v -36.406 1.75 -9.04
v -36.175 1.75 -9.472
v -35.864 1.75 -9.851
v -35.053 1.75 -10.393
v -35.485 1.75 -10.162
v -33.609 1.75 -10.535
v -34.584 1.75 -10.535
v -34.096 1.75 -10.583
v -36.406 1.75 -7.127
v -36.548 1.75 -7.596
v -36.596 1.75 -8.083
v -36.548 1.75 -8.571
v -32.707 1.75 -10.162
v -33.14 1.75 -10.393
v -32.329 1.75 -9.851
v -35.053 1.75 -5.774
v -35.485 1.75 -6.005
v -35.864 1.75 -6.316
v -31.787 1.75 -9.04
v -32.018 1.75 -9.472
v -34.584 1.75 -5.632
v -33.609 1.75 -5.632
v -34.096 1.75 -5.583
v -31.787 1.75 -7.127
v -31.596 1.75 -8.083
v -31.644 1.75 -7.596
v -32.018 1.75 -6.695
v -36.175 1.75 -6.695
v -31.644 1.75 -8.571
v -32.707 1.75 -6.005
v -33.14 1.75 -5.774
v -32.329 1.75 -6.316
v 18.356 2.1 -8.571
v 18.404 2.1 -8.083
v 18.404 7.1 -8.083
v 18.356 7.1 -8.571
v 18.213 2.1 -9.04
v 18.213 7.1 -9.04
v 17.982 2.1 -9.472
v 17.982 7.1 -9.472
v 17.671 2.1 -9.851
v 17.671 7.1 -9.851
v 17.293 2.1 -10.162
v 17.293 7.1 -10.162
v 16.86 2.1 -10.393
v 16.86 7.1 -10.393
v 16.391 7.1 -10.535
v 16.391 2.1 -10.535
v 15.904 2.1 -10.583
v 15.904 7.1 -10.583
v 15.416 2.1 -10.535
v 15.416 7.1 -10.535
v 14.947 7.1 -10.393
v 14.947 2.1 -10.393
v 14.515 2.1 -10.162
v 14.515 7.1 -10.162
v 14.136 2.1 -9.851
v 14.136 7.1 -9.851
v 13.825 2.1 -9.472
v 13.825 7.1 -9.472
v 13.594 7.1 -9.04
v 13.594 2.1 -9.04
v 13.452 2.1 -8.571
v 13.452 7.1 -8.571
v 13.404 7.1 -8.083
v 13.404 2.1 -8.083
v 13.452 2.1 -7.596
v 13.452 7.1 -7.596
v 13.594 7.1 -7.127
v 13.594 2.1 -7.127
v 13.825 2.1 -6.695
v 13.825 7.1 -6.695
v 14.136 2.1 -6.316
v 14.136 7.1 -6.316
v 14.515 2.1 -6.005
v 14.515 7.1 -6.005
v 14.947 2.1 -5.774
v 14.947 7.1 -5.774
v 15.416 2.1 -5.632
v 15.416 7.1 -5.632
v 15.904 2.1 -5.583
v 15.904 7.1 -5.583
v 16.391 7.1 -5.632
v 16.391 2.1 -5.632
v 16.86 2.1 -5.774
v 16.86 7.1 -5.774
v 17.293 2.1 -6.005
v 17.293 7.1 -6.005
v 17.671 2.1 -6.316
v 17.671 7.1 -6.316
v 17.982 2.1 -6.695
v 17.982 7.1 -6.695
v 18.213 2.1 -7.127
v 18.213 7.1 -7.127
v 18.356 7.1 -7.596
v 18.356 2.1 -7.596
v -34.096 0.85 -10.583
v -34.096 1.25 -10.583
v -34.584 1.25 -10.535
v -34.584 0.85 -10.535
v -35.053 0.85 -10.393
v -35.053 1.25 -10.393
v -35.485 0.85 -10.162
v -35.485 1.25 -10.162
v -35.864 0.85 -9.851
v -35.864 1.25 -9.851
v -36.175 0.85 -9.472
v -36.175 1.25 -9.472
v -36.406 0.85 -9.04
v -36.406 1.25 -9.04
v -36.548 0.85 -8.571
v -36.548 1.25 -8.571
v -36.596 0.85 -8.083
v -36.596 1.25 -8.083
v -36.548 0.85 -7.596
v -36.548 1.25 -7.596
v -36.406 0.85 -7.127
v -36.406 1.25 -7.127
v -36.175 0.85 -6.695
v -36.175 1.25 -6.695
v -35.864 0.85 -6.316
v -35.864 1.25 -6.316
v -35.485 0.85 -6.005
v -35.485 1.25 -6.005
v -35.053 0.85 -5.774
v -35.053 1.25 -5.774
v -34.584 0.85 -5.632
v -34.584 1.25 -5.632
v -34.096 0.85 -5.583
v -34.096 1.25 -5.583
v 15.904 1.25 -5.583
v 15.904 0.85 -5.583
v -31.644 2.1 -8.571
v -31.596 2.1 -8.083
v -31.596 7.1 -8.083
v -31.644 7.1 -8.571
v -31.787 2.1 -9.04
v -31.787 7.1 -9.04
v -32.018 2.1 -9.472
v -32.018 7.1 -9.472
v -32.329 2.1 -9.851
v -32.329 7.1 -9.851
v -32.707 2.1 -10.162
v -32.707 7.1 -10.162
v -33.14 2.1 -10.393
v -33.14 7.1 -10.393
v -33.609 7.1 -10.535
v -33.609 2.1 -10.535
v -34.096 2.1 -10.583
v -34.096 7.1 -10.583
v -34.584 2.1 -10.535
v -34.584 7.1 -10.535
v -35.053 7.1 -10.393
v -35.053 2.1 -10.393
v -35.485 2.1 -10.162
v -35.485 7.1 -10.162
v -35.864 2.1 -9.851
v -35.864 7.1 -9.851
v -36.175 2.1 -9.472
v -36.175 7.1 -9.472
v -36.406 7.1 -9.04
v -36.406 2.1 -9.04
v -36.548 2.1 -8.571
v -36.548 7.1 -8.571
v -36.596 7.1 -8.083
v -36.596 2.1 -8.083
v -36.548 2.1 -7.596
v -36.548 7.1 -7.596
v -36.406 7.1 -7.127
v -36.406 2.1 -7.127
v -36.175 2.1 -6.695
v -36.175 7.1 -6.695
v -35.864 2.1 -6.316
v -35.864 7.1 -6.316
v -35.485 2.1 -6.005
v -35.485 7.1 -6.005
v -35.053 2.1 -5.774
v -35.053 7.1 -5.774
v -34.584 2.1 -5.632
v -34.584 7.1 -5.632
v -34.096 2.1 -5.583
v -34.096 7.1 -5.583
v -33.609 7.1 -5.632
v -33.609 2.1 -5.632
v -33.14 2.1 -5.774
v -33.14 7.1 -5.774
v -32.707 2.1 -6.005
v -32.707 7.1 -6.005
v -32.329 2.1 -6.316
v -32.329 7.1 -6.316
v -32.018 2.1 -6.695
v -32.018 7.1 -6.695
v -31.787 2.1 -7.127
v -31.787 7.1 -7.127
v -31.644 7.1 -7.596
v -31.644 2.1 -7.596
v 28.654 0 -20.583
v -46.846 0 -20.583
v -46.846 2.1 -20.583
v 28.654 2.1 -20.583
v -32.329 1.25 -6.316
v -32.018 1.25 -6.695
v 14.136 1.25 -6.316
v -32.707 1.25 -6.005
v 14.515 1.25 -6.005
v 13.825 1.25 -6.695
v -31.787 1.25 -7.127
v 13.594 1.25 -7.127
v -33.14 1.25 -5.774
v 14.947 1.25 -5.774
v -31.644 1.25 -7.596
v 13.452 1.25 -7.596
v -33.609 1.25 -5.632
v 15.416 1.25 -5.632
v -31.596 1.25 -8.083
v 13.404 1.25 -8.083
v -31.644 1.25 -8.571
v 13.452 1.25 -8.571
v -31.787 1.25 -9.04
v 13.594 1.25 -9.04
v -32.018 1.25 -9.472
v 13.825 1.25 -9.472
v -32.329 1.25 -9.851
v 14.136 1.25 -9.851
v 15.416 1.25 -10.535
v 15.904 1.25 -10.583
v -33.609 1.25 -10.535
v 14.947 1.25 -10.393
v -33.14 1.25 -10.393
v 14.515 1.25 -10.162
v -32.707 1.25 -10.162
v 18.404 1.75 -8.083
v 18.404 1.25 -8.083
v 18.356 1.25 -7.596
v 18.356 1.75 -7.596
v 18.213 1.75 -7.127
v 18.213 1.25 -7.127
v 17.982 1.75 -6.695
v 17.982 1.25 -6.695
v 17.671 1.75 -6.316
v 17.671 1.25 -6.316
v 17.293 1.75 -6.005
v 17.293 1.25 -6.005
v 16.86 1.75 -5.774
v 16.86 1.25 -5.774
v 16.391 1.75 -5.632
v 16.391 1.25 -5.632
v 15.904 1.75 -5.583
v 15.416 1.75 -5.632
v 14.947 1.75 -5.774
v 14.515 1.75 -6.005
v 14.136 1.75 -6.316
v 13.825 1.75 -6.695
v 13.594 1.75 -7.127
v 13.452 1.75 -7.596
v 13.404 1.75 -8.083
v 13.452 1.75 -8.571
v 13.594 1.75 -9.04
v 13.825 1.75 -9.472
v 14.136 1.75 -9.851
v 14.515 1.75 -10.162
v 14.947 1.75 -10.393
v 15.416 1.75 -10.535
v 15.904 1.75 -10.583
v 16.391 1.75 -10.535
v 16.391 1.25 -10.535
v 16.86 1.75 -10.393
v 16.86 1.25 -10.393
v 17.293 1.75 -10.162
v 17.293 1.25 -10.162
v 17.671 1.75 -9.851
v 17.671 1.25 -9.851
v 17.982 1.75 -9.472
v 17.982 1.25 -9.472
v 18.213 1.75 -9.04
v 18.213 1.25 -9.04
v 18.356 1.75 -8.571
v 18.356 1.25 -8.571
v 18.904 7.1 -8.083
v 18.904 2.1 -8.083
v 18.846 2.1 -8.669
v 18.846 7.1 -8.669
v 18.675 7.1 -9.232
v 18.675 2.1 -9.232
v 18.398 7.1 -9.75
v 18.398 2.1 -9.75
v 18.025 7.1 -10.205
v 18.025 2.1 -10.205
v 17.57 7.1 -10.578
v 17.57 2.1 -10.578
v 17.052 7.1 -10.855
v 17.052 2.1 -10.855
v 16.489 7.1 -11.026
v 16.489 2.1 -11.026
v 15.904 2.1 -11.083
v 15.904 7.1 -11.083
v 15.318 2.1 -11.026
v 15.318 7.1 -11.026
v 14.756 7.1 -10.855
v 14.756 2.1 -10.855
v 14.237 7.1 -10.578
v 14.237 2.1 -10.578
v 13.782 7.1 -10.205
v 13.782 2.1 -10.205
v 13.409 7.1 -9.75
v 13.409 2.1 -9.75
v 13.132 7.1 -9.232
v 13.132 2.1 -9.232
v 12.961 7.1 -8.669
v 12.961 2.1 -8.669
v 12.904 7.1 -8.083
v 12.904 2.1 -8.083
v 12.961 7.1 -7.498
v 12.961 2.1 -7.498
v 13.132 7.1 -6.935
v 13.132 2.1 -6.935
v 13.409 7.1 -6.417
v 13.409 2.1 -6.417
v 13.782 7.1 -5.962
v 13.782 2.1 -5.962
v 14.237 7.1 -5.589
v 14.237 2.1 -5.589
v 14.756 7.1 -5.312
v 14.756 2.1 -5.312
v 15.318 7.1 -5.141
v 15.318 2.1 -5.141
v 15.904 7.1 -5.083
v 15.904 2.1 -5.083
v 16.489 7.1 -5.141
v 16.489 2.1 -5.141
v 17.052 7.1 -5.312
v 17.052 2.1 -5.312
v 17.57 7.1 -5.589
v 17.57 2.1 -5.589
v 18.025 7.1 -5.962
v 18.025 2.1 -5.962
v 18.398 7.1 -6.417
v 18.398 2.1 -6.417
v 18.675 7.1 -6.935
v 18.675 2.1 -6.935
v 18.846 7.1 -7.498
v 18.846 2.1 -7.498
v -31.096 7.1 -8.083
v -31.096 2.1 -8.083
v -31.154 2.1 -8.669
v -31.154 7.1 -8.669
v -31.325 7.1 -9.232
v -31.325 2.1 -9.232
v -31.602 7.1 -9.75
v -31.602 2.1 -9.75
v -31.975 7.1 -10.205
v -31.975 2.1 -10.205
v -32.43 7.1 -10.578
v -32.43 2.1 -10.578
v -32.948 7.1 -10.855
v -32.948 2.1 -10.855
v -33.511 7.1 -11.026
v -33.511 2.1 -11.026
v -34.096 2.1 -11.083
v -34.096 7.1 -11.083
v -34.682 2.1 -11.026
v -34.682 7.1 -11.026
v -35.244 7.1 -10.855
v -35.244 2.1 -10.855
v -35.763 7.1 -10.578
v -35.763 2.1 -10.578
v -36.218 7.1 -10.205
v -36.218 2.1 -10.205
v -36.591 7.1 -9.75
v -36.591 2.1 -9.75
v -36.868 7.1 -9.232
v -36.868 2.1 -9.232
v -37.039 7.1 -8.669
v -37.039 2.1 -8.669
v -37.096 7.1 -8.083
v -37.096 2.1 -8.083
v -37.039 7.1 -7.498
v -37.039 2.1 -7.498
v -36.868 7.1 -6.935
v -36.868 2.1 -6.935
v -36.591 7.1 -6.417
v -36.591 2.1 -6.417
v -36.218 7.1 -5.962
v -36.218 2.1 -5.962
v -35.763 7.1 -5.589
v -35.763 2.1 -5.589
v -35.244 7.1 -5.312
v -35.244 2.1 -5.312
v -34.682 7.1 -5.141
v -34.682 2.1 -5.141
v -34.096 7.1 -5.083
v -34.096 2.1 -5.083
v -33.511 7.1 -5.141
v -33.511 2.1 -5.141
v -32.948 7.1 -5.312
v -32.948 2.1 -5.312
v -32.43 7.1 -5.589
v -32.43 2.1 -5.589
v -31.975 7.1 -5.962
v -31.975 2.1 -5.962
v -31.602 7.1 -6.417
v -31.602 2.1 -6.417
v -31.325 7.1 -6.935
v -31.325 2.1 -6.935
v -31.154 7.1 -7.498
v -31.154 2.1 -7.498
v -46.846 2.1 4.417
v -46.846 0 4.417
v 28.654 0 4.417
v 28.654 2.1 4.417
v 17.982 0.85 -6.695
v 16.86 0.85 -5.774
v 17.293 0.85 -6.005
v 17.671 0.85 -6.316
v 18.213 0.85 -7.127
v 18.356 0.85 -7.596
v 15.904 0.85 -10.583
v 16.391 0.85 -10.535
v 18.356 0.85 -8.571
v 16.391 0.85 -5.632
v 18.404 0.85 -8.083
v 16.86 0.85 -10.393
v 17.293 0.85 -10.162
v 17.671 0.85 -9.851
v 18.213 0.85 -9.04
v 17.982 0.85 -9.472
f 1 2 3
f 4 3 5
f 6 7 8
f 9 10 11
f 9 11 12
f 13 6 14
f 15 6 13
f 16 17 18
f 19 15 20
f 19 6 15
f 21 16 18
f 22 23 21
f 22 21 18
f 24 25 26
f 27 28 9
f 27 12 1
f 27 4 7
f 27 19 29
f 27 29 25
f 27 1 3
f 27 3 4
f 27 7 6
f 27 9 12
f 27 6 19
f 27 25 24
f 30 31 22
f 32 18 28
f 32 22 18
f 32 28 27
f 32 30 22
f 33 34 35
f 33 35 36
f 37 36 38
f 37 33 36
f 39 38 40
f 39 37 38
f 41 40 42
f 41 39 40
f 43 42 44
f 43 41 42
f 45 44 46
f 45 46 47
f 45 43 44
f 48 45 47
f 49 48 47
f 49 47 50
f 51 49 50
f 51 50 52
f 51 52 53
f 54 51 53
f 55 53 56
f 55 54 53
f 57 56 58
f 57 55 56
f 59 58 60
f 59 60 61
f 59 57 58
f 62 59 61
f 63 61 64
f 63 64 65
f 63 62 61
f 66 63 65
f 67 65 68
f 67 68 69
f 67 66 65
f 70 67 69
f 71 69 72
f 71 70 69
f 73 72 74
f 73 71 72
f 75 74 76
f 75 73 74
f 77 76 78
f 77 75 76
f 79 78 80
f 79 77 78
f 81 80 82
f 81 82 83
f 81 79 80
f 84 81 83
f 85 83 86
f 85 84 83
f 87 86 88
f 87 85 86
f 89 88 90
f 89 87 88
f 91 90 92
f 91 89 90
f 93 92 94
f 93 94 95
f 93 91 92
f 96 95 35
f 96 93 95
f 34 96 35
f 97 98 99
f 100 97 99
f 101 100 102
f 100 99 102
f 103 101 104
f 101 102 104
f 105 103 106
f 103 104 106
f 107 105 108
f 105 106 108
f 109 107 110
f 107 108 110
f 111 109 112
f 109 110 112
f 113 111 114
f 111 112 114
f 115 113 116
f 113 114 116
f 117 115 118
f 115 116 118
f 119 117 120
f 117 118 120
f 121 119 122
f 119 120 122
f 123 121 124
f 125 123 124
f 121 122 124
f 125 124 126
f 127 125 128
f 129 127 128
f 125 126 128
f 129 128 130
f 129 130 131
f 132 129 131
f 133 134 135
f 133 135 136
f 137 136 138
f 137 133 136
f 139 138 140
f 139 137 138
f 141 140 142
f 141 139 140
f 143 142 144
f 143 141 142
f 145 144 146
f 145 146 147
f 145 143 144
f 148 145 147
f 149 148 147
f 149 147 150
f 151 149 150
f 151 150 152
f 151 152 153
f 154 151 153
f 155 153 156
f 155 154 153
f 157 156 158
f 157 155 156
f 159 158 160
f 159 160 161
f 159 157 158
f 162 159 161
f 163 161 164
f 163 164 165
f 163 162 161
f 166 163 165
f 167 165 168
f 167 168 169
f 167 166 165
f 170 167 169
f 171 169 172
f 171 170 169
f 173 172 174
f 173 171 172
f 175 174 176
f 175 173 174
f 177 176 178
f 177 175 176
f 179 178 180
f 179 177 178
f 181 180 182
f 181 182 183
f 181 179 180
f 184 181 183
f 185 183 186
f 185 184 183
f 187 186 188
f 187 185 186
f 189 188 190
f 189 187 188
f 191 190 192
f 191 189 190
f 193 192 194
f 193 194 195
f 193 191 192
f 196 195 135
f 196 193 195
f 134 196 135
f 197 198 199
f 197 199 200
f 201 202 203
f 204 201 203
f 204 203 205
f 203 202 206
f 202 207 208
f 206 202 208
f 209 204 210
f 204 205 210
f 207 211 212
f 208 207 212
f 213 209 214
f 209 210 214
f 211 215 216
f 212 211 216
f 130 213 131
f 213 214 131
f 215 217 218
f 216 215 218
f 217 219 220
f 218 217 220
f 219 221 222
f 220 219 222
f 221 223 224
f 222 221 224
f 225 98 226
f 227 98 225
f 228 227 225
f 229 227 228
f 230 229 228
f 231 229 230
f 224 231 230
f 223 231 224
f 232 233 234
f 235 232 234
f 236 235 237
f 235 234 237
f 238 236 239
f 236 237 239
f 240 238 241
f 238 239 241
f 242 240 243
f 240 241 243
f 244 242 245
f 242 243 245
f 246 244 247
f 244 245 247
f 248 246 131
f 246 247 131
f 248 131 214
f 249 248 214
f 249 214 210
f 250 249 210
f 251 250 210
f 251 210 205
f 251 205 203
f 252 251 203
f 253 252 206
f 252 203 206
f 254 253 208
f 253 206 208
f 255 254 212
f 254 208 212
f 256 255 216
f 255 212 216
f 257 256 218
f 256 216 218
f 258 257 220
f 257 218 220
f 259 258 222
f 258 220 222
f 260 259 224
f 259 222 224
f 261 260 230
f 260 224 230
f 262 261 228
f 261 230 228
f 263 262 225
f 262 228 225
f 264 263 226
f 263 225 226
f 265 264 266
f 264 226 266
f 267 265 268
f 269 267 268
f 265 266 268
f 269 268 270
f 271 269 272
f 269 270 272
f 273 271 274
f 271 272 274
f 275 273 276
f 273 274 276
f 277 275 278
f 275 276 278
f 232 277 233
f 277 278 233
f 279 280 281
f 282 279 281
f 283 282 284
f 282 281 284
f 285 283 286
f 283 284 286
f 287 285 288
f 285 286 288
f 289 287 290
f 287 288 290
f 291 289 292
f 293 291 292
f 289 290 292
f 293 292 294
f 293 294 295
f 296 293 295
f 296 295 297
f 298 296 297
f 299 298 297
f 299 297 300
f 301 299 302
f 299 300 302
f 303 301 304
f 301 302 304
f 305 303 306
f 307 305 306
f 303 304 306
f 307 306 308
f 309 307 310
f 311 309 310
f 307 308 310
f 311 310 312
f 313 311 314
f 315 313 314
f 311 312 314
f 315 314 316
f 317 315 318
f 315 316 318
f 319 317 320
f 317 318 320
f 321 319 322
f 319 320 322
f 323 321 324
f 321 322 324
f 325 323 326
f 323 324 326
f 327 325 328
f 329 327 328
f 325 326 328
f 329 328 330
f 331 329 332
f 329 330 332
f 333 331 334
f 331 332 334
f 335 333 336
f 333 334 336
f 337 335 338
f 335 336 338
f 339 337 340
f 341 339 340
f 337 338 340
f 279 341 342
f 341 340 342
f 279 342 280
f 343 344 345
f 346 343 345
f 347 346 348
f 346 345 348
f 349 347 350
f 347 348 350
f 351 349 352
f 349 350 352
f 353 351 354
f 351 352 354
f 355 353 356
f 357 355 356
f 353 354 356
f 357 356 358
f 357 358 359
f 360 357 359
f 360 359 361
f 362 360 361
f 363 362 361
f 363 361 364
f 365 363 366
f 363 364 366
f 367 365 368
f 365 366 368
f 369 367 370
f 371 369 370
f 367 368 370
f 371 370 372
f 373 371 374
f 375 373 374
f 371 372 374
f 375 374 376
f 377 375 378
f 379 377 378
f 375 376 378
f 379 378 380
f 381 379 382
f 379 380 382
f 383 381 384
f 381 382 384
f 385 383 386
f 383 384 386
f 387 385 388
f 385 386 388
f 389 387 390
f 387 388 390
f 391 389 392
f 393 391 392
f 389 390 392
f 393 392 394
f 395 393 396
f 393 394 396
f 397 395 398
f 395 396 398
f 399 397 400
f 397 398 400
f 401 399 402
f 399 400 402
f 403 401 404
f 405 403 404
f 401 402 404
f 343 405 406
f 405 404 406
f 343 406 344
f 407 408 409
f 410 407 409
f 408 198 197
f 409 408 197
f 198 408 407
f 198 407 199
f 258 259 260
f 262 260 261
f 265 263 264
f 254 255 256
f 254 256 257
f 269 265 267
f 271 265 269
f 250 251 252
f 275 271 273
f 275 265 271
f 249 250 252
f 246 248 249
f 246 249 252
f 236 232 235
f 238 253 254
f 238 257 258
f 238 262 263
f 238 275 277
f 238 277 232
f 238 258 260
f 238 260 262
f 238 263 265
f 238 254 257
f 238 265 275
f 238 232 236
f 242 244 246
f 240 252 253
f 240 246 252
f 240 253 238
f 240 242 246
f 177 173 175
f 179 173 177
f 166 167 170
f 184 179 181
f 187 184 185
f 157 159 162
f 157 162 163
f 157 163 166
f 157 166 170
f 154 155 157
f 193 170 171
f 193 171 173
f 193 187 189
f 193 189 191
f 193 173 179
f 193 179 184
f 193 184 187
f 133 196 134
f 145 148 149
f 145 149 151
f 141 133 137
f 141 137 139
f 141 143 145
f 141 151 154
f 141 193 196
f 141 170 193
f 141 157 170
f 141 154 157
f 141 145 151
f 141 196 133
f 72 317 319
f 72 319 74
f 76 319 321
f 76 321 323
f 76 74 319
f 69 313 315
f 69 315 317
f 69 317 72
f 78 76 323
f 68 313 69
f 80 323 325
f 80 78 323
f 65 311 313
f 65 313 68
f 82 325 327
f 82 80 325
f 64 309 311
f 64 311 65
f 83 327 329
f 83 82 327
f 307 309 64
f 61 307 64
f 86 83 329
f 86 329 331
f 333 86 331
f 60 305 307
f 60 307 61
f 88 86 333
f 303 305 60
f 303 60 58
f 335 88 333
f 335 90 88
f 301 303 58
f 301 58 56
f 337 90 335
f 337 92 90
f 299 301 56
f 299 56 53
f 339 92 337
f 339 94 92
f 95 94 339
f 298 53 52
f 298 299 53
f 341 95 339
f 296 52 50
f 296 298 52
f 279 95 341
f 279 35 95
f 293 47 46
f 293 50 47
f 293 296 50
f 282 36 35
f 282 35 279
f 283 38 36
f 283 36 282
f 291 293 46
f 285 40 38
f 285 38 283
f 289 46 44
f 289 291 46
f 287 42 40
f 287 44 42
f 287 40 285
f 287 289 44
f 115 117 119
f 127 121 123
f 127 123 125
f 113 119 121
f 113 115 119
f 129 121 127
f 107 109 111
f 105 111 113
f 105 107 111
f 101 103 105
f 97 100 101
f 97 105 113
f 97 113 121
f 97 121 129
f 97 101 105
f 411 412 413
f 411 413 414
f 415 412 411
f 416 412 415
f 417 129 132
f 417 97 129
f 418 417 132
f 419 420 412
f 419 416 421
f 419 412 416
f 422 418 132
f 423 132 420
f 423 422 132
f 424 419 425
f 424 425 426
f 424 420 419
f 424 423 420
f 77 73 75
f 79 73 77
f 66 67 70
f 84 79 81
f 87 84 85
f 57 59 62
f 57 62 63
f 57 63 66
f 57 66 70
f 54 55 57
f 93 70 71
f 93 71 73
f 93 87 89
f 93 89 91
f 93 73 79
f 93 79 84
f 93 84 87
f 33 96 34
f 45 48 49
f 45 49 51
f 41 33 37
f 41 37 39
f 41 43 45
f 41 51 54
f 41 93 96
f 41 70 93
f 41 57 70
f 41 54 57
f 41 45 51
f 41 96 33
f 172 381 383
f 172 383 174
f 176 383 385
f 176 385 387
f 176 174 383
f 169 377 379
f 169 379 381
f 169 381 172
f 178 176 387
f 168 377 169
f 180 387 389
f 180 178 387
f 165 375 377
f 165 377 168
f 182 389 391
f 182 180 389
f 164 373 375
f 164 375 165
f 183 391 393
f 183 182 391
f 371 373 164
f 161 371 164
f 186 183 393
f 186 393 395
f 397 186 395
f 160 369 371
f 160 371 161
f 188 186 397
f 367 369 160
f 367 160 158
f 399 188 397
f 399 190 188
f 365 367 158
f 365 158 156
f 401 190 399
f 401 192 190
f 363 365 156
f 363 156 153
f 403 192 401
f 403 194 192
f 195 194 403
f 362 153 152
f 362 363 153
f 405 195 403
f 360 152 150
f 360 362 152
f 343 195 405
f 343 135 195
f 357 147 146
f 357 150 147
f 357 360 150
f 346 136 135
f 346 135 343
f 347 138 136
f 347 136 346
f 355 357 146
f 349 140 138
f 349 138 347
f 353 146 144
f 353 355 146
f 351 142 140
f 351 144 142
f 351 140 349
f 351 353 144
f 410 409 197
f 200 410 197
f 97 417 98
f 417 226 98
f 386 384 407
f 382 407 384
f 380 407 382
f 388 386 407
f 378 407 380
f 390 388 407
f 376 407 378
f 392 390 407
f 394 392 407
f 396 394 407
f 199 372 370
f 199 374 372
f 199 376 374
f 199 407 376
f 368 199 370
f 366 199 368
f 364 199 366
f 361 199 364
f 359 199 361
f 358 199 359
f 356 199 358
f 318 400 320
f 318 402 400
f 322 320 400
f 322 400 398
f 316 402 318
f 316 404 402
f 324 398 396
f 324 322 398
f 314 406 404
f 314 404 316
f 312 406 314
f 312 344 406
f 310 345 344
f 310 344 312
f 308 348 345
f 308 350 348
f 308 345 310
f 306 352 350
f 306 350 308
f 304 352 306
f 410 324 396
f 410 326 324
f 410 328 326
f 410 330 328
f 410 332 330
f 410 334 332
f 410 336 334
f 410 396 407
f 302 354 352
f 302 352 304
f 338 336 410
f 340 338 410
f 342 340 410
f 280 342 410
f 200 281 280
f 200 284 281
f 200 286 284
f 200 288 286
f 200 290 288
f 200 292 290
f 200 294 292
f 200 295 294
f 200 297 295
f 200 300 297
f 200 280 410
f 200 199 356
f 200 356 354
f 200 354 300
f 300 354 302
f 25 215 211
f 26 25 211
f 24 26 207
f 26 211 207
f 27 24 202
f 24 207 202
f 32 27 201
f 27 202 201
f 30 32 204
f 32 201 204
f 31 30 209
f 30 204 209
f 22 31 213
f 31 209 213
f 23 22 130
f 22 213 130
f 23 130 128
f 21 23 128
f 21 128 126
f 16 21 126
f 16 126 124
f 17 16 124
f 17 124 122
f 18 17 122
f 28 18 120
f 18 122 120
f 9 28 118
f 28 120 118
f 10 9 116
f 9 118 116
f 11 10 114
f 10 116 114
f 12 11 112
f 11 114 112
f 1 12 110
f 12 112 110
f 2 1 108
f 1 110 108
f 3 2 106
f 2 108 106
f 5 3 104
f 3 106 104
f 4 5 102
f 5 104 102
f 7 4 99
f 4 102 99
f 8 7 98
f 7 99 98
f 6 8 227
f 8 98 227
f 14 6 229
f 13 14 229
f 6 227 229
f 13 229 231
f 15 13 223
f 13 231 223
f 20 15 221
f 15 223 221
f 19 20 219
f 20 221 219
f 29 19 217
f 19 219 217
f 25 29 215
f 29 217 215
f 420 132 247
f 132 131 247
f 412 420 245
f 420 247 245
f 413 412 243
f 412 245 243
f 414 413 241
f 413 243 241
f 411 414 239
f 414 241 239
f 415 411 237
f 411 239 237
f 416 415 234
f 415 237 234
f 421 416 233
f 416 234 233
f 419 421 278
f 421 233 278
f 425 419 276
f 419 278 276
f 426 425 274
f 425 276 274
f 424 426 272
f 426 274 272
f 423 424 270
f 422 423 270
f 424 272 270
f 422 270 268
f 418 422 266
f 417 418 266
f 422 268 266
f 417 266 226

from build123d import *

# Parameters (mm, degrees)
SKETCH1_W               = 75.5
SKETCH1_H               = 25
BOSS_EXTRUDE1_DEPTH     = 2.1
CUT_EXTRUDE1_DEPTH      = 0.2
CUT_EXTRUDE1_DEPTH_BACK = 0.2
SKETCH4_R               = 3
SKETCH4_R_2             = 2.5
BOSS_EXTRUDE2_DEPTH     = 5
SKETCH5_R               = 2.5
CUT_EXTRUDE5_DEPTH      = 0.5


with BuildPart() as part:
    # Sketch1 → Boss-Extrude1 (new body)
    with BuildSketch(Plane(origin=(0, 0, 0), x_dir=(1, 0, 0), z_dir=(0, 1, 0))):
        with Locations((-9.096373467, 8.083487785)):
            Rectangle(SKETCH1_W, SKETCH1_H)
    extrude(amount=BOSS_EXTRUDE1_DEPTH)

    # Sketch3 → Cut-Extrude1 (cut, two sides)
    with BuildSketch(Plane(origin=(0, 1.05, 0), x_dir=(-1, 0, 0), z_dir=(0, -1, 0))) as cut_extrude1_sk:
        with BuildLine():
            Line((34.096373467, 5.583487785), (-15.903626533, 5.583487785))
            ThreePointArc((-15.903626533, 5.583487785), (-18.403626533, 8.083487785), (-15.903626533, 10.583487785))
            Line((-15.903626533, 10.583487785), (34.096373467, 10.583487785))
            ThreePointArc((34.096373467, 10.583487785), (36.596373467, 8.083487785), (34.096373467, 5.583487785))
        make_face()
    extrude(amount=CUT_EXTRUDE1_DEPTH, mode=Mode.SUBTRACT)
    extrude(cut_extrude1_sk.sketch, amount=-CUT_EXTRUDE1_DEPTH_BACK, mode=Mode.SUBTRACT)

    # Sketch4 → Boss-Extrude2 (add)
    with BuildSketch(Plane(origin=(0, 2.1, 0), x_dir=(1, 0, 0), z_dir=(0, 1, 0))):
        with Locations((-34.096373467, 8.083487785)):
            Circle(SKETCH4_R)
        with Locations((-34.096373467, 8.083487785)):
            Circle(SKETCH4_R_2, mode=Mode.SUBTRACT)
        with Locations((15.903626533, 8.083487785)):
            Circle(SKETCH4_R)
        with Locations((15.903626533, 8.083487785)):
            Circle(SKETCH4_R_2, mode=Mode.SUBTRACT)
    extrude(amount=BOSS_EXTRUDE2_DEPTH)

    # Sketch5 → Cut-Extrude5 (cut)
    with BuildSketch(Plane.XZ.offset(-1.25)):
        with Locations((-34.096373467, -8.083487785)):
            Circle(SKETCH5_R)
        with Locations((15.903626533, -8.083487785)):
            Circle(SKETCH5_R)
    extrude(amount=-CUT_EXTRUDE5_DEPTH, mode=Mode.SUBTRACT)


solid = part.part
